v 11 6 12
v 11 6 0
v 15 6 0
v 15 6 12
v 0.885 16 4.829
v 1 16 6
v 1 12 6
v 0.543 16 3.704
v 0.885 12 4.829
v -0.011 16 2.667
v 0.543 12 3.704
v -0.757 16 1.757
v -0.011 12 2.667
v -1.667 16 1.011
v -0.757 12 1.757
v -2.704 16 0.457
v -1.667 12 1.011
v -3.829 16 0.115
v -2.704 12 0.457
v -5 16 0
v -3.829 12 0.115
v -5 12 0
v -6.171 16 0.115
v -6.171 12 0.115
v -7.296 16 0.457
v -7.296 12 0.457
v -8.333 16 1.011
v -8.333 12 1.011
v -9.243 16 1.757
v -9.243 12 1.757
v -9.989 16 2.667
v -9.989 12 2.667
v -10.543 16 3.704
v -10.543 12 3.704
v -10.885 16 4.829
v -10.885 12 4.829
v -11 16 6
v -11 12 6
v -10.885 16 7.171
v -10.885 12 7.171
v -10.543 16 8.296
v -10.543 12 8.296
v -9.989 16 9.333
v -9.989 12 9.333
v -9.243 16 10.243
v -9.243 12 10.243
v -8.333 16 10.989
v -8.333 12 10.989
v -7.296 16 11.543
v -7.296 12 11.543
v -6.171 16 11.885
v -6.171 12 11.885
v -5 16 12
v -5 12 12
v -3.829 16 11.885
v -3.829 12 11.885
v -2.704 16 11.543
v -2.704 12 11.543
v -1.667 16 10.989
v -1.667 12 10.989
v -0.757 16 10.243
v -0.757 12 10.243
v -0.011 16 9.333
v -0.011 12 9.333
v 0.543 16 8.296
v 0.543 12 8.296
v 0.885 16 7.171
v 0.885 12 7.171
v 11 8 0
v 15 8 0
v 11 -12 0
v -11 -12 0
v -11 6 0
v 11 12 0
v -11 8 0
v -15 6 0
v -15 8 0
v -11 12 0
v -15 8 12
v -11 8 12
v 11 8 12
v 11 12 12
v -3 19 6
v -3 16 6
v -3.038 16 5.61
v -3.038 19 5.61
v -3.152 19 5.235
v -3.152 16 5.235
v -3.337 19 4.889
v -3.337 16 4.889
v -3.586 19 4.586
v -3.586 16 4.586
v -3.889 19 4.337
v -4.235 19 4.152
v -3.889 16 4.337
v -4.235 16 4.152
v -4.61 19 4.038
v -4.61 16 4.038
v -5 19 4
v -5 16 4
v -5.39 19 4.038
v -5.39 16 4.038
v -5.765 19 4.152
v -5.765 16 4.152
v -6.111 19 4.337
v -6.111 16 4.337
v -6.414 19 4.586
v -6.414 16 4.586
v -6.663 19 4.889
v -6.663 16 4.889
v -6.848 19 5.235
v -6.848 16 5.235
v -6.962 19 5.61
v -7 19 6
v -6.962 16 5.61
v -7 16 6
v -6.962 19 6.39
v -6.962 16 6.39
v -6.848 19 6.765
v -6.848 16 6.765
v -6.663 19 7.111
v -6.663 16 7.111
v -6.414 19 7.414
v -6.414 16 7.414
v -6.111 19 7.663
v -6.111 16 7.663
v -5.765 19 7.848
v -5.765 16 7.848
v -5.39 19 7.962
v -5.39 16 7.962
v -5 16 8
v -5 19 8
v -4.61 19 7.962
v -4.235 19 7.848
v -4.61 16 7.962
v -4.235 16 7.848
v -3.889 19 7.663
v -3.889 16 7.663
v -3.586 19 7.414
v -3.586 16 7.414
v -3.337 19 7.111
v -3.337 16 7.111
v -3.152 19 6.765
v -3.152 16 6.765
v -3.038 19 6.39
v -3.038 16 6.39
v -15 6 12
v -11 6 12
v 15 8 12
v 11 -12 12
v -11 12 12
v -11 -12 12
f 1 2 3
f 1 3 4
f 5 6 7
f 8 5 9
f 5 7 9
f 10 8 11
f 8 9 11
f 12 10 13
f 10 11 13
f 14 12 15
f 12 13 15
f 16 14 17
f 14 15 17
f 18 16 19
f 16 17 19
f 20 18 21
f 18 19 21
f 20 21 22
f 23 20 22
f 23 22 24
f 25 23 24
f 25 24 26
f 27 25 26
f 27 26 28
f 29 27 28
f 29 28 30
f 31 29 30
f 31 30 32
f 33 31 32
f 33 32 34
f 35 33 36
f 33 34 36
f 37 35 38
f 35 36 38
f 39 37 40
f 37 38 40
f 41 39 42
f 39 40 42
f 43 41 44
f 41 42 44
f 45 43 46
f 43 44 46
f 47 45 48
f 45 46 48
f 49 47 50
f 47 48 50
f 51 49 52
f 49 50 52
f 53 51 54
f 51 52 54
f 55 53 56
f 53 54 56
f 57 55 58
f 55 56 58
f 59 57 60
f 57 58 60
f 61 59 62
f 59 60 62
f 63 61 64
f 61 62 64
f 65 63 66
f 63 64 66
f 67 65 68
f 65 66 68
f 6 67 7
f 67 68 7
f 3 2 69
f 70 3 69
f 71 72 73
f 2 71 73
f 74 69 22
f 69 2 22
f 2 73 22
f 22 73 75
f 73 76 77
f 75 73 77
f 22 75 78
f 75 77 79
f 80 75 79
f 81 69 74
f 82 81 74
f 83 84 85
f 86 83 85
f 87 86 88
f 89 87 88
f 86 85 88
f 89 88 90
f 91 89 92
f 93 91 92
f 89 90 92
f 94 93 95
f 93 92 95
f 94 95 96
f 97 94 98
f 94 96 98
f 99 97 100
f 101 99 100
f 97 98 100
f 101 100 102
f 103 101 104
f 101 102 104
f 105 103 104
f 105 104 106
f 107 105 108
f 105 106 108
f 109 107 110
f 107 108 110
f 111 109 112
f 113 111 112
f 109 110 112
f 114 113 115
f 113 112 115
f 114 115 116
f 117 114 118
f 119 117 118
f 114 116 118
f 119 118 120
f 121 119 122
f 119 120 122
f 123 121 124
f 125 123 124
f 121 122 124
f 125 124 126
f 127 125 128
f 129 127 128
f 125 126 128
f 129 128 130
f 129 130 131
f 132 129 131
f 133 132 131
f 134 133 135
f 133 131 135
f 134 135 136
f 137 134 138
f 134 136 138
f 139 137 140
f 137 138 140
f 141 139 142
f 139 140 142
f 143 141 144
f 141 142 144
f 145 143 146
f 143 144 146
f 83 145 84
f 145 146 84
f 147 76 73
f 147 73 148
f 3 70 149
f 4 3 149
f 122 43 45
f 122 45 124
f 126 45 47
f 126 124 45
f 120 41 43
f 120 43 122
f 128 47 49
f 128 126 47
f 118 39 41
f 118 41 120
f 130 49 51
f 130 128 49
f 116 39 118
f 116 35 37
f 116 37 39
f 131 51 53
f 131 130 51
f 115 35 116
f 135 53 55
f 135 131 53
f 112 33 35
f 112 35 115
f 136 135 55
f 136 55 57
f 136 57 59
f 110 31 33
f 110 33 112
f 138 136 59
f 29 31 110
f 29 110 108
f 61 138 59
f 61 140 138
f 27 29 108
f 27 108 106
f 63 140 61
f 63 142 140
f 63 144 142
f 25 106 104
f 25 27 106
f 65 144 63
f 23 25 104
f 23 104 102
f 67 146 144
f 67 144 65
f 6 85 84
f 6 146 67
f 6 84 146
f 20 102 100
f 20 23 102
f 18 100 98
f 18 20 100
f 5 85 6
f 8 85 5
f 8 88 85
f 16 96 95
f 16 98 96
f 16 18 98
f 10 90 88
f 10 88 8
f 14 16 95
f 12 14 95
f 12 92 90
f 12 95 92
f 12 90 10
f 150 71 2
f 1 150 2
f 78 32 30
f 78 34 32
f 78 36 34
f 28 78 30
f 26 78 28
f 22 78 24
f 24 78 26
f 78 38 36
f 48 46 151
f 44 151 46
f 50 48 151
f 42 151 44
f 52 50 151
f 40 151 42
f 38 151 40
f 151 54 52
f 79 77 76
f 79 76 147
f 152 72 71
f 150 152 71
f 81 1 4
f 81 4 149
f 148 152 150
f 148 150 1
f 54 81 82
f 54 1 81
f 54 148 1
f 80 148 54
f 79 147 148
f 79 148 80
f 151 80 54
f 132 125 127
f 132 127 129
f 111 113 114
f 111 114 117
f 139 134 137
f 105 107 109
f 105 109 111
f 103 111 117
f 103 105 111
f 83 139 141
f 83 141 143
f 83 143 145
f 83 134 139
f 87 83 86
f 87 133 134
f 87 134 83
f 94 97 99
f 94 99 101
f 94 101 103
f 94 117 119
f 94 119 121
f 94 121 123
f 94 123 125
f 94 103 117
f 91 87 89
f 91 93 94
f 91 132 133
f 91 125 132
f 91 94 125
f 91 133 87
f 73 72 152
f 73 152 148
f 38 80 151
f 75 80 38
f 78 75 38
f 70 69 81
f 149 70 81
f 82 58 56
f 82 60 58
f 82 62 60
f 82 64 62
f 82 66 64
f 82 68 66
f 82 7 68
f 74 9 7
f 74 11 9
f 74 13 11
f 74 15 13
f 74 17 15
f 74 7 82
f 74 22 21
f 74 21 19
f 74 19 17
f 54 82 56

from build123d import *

# Parameters (mm, degrees)
SKETCH1_W           = 22
SKETCH1_H           = 24
BOSS_EXTRUDE1_DEPTH = 12
BOSS_EXTRUDE2_START = 4
SKETCH2_W           = 12
SKETCH2_H           = 2
BOSS_EXTRUDE2_DEPTH = 30
SKETCH3_R           = 6
BOSS_EXTRUDE3_DEPTH = 4
SKETCH4_R           = 2
BOSS_EXTRUDE4_DEPTH = 3


with BuildPart() as part:
    # Sketch1 → Boss-Extrude1 (new body)
    with BuildSketch(Plane.XY):
        Rectangle(SKETCH1_W, SKETCH1_H)
    extrude(amount=BOSS_EXTRUDE1_DEPTH)

    # Sketch2 → Boss-Extrude2 (add)
    with BuildSketch(Plane.ZY.offset(11).offset(BOSS_EXTRUDE2_START)):
        with Locations((6, 7)):
            Rectangle(SKETCH2_W, SKETCH2_H)
    extrude(amount=-BOSS_EXTRUDE2_DEPTH)

    # Sketch3 → Boss-Extrude3 (add)
    with BuildSketch(Plane(origin=(0, 12, 0), x_dir=(1, 0, 0), z_dir=(0, 1, 0))):
        with Locations((-5, -6)):
            Circle(SKETCH3_R)
    extrude(amount=BOSS_EXTRUDE3_DEPTH)

    # Sketch4 → Boss-Extrude4 (add)
    with BuildSketch(Plane(origin=(0, 16, 0), x_dir=(1, 0, 0), z_dir=(0, 1, 0))):
        with Locations((-5, -6)):
            Circle(SKETCH4_R)
    extrude(amount=BOSS_EXTRUDE4_DEPTH)


solid = part.part
